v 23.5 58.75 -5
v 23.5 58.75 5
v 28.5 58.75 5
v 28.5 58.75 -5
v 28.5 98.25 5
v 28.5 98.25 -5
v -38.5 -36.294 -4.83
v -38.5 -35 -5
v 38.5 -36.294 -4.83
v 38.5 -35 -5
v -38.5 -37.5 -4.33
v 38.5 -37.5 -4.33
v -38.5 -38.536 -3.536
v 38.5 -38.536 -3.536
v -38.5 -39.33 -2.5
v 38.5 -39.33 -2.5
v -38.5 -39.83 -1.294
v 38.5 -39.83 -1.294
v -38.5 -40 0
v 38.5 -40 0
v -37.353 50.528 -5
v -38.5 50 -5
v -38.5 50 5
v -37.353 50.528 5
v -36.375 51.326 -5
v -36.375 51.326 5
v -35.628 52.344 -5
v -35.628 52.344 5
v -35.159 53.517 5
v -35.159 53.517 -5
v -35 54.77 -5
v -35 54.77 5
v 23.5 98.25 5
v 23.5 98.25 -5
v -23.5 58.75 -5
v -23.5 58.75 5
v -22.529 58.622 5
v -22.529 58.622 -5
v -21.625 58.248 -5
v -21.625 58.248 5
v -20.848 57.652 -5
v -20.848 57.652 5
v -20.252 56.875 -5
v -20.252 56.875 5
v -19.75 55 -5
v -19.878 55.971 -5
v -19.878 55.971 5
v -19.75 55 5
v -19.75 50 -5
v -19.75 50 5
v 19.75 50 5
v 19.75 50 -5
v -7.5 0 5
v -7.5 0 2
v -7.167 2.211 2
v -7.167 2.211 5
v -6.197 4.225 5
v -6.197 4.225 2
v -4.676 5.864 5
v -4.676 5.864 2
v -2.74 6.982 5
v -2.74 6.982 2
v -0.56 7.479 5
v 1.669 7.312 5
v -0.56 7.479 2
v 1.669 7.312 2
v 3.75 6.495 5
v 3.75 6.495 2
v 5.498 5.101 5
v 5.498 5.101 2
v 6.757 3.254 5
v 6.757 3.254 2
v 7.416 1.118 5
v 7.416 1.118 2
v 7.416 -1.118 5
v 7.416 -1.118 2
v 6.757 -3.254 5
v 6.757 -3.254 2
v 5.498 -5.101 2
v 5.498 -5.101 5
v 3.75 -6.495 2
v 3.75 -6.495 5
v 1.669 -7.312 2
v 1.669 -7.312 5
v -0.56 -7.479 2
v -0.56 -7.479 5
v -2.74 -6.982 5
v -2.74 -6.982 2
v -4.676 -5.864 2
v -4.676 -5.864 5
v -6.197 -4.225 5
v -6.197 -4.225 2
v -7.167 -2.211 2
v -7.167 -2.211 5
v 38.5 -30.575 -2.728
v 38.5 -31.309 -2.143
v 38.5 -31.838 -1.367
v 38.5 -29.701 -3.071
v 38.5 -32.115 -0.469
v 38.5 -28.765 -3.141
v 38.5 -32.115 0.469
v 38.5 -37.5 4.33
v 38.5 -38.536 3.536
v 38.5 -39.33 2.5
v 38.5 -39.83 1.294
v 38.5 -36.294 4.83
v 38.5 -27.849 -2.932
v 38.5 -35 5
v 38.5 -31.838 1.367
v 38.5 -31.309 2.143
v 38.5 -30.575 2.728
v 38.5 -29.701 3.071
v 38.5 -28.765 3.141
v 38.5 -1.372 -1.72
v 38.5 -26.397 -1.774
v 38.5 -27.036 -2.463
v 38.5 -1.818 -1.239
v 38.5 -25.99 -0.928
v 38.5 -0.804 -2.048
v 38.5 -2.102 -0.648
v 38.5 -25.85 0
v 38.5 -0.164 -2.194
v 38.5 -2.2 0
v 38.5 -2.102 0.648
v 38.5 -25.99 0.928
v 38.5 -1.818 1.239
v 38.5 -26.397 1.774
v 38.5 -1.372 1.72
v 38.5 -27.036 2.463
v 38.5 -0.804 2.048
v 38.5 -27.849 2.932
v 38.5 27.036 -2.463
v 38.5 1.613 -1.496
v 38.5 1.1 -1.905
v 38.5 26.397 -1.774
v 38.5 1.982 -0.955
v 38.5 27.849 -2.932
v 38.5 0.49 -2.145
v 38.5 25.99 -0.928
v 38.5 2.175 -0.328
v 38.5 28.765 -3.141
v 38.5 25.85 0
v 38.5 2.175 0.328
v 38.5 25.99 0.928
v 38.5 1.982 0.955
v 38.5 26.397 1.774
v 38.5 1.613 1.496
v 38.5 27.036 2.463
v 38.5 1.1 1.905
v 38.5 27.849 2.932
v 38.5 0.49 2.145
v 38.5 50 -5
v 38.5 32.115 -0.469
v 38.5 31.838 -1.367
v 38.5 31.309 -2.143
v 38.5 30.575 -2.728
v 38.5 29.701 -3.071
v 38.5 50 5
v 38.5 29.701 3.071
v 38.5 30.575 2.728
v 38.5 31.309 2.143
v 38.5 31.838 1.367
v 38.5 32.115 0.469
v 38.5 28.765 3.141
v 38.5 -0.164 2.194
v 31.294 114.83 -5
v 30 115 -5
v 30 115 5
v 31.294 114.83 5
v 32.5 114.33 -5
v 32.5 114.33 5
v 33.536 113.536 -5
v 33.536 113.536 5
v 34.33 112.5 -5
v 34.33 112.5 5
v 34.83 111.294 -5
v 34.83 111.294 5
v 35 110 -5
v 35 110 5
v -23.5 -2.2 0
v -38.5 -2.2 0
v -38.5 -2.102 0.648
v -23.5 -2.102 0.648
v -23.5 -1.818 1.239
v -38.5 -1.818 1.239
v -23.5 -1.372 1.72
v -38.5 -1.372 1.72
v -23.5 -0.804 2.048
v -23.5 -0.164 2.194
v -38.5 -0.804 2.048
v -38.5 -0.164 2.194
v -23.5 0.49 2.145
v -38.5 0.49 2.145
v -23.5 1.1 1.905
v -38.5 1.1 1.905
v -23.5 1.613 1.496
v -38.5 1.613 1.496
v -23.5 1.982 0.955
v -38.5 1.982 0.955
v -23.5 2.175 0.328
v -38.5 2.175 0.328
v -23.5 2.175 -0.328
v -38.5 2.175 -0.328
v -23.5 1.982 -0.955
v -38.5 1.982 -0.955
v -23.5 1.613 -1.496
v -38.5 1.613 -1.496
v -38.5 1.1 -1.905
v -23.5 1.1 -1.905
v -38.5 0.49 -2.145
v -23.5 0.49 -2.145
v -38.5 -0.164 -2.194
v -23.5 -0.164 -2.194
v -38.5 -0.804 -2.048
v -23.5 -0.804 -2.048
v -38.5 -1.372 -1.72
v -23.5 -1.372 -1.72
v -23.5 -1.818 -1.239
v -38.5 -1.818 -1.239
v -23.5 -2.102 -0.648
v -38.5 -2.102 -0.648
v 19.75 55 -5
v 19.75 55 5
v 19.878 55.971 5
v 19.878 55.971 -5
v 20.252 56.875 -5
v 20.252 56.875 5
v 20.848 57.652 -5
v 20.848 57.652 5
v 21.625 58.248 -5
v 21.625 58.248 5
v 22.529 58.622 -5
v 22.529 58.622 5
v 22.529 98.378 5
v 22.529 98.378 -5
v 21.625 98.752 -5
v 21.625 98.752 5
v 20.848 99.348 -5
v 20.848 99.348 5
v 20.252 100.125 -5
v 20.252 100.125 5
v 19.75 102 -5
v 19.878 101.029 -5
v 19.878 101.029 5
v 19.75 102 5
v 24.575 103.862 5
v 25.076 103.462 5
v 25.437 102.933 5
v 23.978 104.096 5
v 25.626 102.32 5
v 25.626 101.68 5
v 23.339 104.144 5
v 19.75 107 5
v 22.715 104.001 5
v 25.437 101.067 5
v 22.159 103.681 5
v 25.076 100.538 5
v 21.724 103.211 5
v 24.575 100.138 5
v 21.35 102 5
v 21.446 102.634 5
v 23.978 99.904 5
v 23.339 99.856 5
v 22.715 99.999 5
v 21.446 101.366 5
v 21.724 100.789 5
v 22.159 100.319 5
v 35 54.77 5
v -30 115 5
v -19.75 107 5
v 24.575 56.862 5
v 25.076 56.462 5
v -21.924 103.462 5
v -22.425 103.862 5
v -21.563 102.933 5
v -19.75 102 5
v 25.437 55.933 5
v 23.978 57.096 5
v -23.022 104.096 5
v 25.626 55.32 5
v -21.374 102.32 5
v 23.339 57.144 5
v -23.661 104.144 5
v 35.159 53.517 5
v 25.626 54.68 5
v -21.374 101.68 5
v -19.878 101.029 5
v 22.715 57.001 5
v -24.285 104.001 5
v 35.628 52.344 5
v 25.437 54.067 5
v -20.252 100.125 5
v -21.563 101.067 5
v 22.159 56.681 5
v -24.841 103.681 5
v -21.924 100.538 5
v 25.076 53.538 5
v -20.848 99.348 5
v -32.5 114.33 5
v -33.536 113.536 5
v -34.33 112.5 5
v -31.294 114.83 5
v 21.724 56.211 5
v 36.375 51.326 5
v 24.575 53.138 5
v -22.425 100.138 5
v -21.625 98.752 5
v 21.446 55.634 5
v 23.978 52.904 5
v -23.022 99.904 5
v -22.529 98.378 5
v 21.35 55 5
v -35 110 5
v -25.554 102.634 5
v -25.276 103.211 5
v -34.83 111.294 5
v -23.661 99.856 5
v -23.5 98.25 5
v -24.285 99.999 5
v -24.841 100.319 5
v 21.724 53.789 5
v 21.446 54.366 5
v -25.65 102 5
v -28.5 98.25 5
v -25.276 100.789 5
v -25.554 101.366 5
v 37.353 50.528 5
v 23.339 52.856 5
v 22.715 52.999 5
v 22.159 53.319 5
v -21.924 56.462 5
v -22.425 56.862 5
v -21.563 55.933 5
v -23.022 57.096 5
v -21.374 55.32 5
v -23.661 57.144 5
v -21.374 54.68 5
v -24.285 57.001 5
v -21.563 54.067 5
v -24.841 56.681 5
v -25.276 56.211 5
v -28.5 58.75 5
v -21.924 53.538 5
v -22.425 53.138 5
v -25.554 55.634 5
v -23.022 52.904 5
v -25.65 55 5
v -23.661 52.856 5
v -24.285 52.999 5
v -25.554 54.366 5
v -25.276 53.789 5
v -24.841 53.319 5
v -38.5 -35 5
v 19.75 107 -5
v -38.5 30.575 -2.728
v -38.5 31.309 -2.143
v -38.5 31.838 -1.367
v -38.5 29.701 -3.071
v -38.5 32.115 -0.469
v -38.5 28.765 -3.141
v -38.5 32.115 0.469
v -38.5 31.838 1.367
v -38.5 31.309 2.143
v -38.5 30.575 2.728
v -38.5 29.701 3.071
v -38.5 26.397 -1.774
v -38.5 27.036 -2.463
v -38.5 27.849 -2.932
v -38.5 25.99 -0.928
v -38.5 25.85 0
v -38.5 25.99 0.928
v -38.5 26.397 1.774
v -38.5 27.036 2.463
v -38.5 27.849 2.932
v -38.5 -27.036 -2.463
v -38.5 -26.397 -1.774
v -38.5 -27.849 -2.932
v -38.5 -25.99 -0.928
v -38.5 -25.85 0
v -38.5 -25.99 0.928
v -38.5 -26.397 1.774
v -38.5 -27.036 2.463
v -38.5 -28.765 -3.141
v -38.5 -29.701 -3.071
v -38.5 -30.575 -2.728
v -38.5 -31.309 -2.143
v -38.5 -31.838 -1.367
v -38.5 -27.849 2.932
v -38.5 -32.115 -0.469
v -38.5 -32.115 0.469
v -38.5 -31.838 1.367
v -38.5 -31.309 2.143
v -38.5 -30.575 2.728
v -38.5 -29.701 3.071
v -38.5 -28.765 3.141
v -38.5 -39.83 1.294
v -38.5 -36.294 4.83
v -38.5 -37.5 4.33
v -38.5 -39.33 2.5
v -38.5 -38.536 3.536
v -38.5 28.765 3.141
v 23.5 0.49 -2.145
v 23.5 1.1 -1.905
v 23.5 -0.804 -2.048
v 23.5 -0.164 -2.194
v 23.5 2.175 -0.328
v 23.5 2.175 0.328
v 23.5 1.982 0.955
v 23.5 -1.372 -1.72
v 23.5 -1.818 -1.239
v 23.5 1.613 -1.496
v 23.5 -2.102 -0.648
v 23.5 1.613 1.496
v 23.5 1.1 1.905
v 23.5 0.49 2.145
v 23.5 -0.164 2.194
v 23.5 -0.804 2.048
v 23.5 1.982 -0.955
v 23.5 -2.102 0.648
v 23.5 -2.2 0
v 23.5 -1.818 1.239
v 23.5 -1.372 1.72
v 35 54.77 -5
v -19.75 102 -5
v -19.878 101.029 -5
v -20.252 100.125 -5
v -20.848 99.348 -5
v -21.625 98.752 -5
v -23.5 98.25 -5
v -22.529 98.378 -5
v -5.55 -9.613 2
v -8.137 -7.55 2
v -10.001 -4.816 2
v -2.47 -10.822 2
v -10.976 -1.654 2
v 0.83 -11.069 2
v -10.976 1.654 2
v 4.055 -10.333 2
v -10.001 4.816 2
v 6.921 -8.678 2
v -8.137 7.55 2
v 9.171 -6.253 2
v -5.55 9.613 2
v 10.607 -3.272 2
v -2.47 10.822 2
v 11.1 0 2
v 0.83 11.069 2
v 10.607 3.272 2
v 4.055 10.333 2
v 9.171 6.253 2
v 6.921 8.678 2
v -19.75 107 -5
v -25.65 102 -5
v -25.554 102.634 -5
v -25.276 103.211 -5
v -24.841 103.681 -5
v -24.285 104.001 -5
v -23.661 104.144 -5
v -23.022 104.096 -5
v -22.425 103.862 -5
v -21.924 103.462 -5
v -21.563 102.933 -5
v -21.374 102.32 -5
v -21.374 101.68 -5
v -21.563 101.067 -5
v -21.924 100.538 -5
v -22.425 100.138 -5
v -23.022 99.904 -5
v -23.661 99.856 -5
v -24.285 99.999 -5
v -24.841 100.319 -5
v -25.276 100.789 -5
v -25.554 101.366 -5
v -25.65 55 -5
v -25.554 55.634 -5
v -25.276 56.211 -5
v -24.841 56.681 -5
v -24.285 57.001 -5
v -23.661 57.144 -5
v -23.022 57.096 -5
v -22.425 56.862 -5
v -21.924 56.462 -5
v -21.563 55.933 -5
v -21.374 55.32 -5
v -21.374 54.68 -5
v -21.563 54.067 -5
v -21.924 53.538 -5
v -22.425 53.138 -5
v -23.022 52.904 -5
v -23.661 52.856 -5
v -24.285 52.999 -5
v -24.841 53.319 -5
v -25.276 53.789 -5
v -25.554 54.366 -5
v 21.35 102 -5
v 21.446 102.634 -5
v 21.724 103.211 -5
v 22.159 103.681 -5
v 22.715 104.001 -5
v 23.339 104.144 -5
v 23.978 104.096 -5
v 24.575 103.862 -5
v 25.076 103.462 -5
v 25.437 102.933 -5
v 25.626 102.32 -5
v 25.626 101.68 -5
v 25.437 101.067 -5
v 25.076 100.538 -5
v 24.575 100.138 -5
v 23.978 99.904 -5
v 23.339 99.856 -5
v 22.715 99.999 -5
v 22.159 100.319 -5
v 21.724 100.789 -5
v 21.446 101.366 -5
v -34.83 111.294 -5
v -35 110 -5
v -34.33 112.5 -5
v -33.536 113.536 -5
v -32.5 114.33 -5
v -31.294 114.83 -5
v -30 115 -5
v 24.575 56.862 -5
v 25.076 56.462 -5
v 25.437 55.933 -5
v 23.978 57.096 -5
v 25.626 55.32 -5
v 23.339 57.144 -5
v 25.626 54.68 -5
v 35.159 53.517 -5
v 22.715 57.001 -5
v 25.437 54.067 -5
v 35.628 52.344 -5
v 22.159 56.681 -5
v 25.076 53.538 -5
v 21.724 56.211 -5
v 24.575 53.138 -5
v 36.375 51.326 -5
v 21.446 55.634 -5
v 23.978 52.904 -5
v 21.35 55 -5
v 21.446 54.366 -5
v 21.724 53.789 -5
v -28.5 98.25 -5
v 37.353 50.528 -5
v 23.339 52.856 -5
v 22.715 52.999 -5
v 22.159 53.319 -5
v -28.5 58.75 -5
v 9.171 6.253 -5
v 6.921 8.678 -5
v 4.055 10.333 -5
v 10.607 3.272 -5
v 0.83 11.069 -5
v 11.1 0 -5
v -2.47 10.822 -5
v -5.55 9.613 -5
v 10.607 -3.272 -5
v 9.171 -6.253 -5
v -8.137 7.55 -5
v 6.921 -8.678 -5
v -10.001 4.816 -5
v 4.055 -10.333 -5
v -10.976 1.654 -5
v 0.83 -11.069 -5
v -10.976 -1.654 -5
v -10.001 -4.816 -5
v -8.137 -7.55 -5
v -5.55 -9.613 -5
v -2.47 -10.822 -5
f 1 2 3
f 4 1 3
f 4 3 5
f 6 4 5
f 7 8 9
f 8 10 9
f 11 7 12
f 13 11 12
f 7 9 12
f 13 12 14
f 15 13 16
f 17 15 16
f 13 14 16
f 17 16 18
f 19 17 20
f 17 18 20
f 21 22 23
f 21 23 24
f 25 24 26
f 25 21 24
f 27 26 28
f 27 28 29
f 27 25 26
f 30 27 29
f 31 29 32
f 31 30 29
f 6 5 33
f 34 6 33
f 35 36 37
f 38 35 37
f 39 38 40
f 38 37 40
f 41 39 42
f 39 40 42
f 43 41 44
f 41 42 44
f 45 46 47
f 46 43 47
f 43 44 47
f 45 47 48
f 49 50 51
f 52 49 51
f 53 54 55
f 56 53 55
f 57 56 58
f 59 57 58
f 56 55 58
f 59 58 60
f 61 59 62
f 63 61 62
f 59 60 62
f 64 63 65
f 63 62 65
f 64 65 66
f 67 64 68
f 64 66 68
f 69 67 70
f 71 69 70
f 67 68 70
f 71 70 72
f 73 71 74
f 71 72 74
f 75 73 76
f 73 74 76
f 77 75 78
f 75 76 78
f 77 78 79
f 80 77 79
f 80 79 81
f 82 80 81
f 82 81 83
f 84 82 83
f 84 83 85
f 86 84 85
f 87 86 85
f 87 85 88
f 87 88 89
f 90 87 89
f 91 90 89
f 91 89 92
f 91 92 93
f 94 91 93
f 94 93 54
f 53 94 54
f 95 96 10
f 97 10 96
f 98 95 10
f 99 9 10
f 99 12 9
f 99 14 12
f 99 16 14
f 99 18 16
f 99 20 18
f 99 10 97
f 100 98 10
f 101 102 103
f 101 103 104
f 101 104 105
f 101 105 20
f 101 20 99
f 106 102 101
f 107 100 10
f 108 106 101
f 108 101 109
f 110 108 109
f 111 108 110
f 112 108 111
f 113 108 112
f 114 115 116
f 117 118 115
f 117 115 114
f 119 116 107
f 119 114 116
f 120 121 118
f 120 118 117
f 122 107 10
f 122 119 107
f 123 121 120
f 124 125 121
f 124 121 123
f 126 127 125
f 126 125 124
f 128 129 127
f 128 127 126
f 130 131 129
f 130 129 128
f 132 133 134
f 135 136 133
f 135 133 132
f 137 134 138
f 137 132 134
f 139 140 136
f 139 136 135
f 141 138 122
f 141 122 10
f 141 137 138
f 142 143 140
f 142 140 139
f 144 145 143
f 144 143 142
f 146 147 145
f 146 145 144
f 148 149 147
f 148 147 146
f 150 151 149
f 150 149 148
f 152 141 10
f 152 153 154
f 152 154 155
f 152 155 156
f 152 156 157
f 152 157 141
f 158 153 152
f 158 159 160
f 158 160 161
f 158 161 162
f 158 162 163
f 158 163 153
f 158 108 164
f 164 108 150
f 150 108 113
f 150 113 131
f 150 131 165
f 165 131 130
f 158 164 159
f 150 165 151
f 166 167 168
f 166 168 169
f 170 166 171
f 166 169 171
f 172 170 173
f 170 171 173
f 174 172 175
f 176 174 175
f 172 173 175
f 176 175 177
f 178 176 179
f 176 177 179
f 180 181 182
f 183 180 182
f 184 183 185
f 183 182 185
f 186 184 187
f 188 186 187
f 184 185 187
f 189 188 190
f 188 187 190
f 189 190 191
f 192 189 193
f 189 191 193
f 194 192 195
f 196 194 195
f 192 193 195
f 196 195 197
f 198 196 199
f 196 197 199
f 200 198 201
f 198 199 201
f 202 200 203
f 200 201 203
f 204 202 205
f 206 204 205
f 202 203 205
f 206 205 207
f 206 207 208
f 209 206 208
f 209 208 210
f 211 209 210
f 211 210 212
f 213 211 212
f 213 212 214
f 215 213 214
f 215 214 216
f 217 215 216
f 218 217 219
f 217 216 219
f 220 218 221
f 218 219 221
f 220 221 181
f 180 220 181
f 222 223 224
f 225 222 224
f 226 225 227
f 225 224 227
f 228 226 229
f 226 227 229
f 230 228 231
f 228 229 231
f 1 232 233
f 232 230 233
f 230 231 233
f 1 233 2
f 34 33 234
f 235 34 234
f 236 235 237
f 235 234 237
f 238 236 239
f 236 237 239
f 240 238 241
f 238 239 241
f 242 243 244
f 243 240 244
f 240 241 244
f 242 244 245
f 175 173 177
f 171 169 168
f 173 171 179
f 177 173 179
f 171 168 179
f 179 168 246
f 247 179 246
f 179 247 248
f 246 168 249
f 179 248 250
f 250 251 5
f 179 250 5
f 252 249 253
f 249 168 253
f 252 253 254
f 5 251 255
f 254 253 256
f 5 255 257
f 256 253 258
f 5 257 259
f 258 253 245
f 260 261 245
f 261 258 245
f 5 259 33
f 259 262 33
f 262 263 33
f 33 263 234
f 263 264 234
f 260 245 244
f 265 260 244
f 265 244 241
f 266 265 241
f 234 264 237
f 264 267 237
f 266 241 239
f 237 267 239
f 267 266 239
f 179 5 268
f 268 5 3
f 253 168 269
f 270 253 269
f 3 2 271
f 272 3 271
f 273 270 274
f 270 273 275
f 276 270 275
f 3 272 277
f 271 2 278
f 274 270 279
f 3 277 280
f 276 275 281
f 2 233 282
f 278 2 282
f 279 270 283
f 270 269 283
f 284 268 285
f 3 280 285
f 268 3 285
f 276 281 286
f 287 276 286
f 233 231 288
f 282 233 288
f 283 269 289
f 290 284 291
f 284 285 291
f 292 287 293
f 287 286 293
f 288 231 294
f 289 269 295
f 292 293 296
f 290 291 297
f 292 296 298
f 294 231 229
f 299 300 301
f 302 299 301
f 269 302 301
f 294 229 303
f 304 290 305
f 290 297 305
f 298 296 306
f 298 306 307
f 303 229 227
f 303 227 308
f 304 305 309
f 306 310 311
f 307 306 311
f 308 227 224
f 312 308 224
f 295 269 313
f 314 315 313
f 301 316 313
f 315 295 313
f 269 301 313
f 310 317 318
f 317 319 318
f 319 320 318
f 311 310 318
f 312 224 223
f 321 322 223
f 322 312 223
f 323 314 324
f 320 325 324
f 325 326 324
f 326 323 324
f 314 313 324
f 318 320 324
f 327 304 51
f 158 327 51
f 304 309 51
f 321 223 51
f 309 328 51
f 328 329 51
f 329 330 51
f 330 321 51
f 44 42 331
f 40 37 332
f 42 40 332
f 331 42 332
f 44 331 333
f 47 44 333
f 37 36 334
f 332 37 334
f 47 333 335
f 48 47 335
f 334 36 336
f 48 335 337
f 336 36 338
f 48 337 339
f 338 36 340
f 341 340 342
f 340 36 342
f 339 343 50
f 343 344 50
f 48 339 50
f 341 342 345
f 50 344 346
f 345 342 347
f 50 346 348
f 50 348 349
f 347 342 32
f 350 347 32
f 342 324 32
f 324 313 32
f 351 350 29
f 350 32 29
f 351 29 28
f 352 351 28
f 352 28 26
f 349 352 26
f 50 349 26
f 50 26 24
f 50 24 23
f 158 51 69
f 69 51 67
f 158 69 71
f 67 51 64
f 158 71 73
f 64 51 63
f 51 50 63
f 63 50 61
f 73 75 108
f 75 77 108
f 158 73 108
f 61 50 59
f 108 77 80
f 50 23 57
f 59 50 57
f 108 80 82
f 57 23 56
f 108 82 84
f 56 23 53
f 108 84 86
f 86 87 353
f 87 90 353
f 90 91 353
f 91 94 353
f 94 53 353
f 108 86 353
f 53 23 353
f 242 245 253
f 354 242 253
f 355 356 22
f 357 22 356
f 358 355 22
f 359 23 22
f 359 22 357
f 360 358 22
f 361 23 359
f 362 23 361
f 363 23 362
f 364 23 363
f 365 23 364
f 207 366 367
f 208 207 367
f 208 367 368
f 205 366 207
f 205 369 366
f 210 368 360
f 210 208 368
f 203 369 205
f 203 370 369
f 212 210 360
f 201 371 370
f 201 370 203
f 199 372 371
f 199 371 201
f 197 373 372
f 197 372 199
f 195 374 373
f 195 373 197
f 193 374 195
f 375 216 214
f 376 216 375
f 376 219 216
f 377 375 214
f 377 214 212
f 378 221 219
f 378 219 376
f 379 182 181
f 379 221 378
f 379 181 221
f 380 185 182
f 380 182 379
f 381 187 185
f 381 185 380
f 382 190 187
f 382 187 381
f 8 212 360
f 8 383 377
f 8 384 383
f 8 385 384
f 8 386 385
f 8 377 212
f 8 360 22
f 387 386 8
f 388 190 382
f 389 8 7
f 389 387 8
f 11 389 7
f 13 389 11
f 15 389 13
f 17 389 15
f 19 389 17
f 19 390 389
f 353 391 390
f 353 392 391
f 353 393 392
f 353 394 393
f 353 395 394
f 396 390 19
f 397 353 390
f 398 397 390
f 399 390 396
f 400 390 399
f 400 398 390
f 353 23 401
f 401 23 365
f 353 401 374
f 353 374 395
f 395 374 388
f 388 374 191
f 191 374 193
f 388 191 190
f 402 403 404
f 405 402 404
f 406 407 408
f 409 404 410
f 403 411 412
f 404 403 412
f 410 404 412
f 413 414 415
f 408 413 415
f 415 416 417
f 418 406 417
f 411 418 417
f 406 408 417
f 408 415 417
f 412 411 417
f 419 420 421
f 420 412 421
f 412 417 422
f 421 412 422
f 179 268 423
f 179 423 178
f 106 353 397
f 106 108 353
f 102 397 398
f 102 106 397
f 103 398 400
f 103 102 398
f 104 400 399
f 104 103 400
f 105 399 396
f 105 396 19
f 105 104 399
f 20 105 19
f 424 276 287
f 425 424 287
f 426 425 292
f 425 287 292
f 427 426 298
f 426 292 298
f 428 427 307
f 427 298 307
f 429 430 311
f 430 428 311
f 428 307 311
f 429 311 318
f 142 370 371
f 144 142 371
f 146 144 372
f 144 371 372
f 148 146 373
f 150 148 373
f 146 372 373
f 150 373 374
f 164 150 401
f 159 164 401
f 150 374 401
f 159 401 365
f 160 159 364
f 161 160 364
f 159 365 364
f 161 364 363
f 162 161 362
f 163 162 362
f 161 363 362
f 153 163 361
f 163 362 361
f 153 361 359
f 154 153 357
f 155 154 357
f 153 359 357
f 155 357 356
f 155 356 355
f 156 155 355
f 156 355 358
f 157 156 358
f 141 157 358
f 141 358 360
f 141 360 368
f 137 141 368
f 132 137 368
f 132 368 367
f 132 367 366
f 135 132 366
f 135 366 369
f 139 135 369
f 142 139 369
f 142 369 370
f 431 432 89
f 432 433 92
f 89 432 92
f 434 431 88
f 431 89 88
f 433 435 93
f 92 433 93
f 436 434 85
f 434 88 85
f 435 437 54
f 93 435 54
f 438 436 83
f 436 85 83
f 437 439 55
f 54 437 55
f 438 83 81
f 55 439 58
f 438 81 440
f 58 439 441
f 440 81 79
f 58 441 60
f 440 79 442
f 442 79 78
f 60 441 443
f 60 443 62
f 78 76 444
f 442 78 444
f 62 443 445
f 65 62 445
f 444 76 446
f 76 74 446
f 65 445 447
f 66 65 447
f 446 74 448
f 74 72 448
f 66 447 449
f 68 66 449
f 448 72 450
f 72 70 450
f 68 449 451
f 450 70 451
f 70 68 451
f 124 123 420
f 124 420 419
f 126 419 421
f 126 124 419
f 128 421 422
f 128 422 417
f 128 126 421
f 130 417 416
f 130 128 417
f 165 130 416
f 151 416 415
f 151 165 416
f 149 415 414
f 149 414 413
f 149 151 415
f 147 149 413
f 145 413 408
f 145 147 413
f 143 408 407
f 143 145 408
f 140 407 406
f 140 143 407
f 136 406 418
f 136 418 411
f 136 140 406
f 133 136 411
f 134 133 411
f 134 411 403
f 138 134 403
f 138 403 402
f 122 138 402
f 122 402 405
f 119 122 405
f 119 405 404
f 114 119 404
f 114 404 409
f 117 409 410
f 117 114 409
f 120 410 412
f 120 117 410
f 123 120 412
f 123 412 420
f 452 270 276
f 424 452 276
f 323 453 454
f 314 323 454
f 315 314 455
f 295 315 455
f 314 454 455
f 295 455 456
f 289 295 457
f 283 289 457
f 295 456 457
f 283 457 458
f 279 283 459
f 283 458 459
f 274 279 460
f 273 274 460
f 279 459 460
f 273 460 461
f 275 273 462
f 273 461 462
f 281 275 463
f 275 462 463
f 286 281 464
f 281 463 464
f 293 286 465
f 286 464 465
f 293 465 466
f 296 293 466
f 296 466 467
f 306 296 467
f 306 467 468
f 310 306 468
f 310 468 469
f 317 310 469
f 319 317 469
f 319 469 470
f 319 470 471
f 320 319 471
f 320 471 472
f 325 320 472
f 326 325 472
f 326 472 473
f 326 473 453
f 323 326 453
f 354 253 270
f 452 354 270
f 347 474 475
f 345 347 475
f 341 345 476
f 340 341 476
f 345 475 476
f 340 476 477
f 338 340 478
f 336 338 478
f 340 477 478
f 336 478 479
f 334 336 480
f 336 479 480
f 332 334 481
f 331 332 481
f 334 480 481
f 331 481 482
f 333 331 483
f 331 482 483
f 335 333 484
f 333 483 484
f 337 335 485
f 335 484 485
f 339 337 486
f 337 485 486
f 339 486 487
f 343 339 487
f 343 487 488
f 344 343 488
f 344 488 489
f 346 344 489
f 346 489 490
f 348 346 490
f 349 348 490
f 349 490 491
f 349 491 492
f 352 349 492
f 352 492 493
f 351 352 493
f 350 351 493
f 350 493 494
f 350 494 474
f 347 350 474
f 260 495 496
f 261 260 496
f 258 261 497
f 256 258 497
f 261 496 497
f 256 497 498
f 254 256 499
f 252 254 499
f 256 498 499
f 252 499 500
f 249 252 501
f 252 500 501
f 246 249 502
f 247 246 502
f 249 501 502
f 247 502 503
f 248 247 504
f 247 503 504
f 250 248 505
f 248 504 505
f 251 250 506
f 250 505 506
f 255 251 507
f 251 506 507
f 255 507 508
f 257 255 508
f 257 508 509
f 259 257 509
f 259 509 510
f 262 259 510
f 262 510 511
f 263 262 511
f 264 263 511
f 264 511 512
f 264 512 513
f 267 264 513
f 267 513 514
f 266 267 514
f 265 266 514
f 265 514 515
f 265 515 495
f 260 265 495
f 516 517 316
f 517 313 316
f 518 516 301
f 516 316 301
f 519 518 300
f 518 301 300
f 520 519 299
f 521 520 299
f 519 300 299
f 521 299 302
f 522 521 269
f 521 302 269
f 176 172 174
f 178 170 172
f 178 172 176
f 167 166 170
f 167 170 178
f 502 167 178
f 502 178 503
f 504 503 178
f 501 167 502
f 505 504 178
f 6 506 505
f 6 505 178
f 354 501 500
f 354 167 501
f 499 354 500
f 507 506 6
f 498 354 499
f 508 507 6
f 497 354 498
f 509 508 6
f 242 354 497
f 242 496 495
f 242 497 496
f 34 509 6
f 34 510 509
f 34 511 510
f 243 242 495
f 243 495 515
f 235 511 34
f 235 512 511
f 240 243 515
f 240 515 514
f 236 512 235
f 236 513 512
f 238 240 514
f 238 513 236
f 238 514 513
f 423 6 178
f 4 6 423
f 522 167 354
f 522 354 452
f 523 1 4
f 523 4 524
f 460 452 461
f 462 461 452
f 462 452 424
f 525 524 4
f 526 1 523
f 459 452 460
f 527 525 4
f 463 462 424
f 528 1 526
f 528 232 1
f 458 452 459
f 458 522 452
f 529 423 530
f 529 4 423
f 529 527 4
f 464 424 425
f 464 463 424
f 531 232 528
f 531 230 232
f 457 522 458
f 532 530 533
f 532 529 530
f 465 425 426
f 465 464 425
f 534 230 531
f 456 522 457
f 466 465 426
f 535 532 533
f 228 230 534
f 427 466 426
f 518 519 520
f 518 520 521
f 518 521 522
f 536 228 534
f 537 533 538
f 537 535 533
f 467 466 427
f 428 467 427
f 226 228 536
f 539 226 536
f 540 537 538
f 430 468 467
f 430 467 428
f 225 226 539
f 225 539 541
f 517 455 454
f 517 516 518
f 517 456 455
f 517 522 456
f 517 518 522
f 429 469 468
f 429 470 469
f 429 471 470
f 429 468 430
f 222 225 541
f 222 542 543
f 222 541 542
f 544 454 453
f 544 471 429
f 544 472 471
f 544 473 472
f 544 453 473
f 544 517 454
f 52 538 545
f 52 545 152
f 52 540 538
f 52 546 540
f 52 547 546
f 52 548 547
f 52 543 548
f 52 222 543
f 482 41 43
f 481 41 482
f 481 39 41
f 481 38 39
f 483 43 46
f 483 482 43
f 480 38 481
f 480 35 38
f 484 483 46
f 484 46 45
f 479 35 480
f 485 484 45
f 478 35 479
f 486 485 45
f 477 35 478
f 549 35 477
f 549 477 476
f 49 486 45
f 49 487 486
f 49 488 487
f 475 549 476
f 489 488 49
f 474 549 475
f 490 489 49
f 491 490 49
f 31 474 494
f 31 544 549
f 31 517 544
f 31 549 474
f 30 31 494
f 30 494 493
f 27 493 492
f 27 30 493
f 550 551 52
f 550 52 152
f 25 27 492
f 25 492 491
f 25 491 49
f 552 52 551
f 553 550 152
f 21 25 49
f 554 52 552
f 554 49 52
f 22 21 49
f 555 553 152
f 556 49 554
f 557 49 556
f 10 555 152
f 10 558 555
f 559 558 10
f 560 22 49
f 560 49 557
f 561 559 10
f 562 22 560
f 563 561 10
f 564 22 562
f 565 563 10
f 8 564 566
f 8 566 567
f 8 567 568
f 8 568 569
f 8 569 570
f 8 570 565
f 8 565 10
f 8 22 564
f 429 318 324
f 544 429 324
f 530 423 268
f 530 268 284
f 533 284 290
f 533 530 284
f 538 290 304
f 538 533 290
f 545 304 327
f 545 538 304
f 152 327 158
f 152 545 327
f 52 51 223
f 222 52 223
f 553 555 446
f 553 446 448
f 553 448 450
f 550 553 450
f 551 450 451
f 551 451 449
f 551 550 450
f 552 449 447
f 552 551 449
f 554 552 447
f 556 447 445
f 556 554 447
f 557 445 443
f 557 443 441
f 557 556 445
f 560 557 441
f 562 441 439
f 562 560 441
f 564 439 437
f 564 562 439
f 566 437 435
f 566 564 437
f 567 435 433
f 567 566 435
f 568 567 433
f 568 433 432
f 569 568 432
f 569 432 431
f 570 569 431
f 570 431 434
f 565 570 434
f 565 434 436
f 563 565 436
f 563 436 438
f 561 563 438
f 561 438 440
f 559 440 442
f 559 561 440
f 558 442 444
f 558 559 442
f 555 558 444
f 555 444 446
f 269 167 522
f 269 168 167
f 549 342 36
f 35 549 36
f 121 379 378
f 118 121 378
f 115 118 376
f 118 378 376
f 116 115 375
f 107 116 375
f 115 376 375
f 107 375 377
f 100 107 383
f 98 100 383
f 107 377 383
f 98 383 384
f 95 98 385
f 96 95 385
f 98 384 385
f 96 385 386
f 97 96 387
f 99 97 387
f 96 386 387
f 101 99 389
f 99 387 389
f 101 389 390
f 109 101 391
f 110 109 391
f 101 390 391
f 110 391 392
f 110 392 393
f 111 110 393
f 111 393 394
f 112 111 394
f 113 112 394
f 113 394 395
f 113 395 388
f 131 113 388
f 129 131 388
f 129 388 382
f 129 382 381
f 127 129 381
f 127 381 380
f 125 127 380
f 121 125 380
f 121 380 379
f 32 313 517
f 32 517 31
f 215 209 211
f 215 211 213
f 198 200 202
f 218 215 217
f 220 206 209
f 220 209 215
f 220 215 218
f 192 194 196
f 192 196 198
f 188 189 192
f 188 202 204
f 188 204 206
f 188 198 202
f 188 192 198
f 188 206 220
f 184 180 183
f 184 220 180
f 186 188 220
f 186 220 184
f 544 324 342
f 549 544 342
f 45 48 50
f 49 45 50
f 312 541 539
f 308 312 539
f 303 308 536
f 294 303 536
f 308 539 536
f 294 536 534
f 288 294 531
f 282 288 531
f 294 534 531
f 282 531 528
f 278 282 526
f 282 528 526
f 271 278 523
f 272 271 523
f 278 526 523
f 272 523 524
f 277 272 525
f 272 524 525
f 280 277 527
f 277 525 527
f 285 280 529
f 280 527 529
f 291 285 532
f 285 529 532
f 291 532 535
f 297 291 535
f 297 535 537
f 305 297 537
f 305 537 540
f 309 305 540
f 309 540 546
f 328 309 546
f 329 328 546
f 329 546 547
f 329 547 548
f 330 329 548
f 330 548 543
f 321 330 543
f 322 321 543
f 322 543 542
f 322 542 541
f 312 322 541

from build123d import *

# Parameters (mm, degrees)
AUFSATZ_LINEAR_AUSTRAGEN1_DEPTH  = 5
SKIZZE2_R                        = 3.15
SCHNITT_LINEAR_AUSTRAGEN1_DEPTH  = 139.488266651
SKIZZE3_R                        = 2.2
SCHNITT_LINEAR_AUSTRAGEN2_DEPTH  = 15
VERRUNDUNG2_R                    = 5
SCHNITT_LINEAR_AUSTRAGEN3_DEPTH  = 122.685044274
F_4_3_4_3_DURCHMESSER_BOHRUNG1_D = 4.3
VERRUNDUNG3_R                    = 5
VERRUNDUNG4_R                    = 5
SKIZZE8_R                        = 11.1
SCHNITT_LINEAR_AUSTRAGEN4_DEPTH  = 7
SKIZZE9_R                        = 7.5
SCHNITT_LINEAR_AUSTRAGEN5_DEPTH  = 10


# Some blends are built 0.0001 mm under size
with BuildPart() as part:
    # Skizze1 → Aufsatz-Linear austragen1 (new, symmetric)
    with BuildSketch(Plane.XY):
        Polygon((38.5, 50), (35, 50), (35, 115), (-35, 115), (-35, 50), (-38.5, 50), (-38.5, -40), (38.5, -40), align=None)
    extrude(amount=AUFSATZ_LINEAR_AUSTRAGEN1_DEPTH, both=True)

    # Skizze2 → Schnitt-Linear austragen1 (cut, through all)
    with BuildSketch(Plane.ZY.offset(38.5)):
        with Locations(Location((0, 29, 0), (0, 0, 270))):
            Circle(SKIZZE2_R)
        with Locations(Location((0, -29, 0), (0, 0, 90))):
            Circle(SKIZZE2_R)
    extrude(amount=-SCHNITT_LINEAR_AUSTRAGEN1_DEPTH, mode=Mode.SUBTRACT)

    # Skizze3 → Schnitt-Linear austragen2 (cut)
    with BuildSketch(Plane.ZY.offset(38.5)):
        with Locations(Location((0, 0, 0), (0, 0, 270))):
            Circle(SKIZZE3_R)
    schnitt_linear_austragen2 = extrude(amount=-SCHNITT_LINEAR_AUSTRAGEN2_DEPTH, mode=Mode.SUBTRACT)

    # Spiegeln1: Schnitt-Linear austragen2 across plane
    add(schnitt_linear_austragen2.mirror(Plane(origin=(0, 0, 0), x_dir=(0, 0, 1), z_dir=(1, 0, 0))), mode=Mode.SUBTRACT)

    # Verrundung2
    verrundung2_edges = [part.edges().sort_by_distance(p)[0] for p in [
        (0, -40, -5),
        (0, -40, 5),
    ]]
    fillet(verrundung2_edges, radius=VERRUNDUNG2_R - 0.0001)  # a hair under: the kernel refuses the full size

    # Skizze5 → Schnitt-Linear austragen3 (cut, through all)
    with BuildSketch(Plane.XY.offset(5)):
        with BuildLine():
            Line((19.75, 102), (19.75, 107))
            Line((19.75, 107), (-19.75, 107))
            Line((-19.75, 107), (-19.75, 102))
            ThreePointArc((-19.75, 102), (-20.848349571, 99.348349571), (-23.5, 98.25))
            Line((-23.5, 98.25), (-28.5, 98.25))
            Line((-28.5, 98.25), (-28.5, 58.75))
            Line((-28.5, 58.75), (-23.5, 58.75))
            ThreePointArc((-23.5, 58.75), (-20.848349571, 57.651650429), (-19.75, 55))
            Line((-19.75, 55), (-19.75, 50))
            Line((-19.75, 50), (19.75, 50))
            Line((19.75, 50), (19.75, 55))
            ThreePointArc((19.75, 55), (20.848349571, 57.651650429), (23.5, 58.75))
            Line((23.5, 58.75), (28.5, 58.75))
            Line((28.5, 58.75), (28.5, 98.25))
            Line((28.5, 98.25), (23.5, 98.25))
            ThreePointArc((23.5, 98.25), (20.848349571, 99.348349571), (19.75, 102))
        make_face()
    extrude(amount=-SCHNITT_LINEAR_AUSTRAGEN3_DEPTH, mode=Mode.SUBTRACT)

    # Ø4.3 (4.3) Durchmesser Bohrung1 (through all)
    with Locations(Plane.XY.offset(5)):
        with Locations((-23.5, 102), (-23.5, 55), (23.5, 55), (23.5, 102)):
            Hole(F_4_3_4_3_DURCHMESSER_BOHRUNG1_D / 2)

    # Verrundung3
    verrundung3_edges = [part.edges().sort_by_distance(p)[0] for p in [
        (-35, 115, 0),
        (35, 115, 0),
    ]]
    fillet(verrundung3_edges, radius=VERRUNDUNG3_R)

    # Verrundung4
    # the kernel refuses this fillet: 5 mm, written as the material it adds along each edge
    with BuildSketch(Plane(origin=(35, 50, -5), x_dir=(0, 1, 0), z_dir=(0, 0, 1))) as verrundung4_piece_1:
        with BuildLine():
            CenterArc((4.769696007, -5), VERRUNDUNG4_R, 90, 72.542396876)
            Line((0, -3.5), (-0.09539392, -3.47))
            ThreePointArc((-0.09539392, -3.47), (-0.1, -1.75), (-0.1, 0))
            Line((-0.1, 0), (0, 0.1))
            Line((0, 0.1), (4.769696007, 0.1))
            Line((4.769696007, 0.1), (4.769696007, 0))
        make_face()
    extrude(amount=10)
    with BuildSketch(Plane(origin=(-35, 50, -5), x_dir=(0, 1, 0), z_dir=(0, 0, 1))) as verrundung4_piece_2:
        with BuildLine():
            CenterArc((4.769696007, 5), VERRUNDUNG4_R, 197.457603124, 72.542396876)
            Line((0, 3.5), (-0.09539392, 3.47))
            ThreePointArc((-0.09539392, 3.47), (-0.1, 1.75), (-0.1, 0))
            Line((-0.1, 0), (0, -0.1))
            Line((0, -0.1), (4.769696007, -0.1))
            Line((4.769696007, -0.1), (4.769696007, 0))
        make_face()
    extrude(amount=10)

    # Skizze8 → Schnitt-Linear austragen4 (cut)
    with BuildSketch(Plane.XY.offset(-5)):
        Circle(SKIZZE8_R)
    extrude(amount=SCHNITT_LINEAR_AUSTRAGEN4_DEPTH, mode=Mode.SUBTRACT)

    # Skizze9 → Schnitt-Linear austragen5 (cut)
    with BuildSketch(Plane(origin=(0, 0, 2), x_dir=(-1, 0, 0), z_dir=(0, 0, -1))):
        Circle(SKIZZE9_R)
    extrude(amount=-SCHNITT_LINEAR_AUSTRAGEN5_DEPTH, mode=Mode.SUBTRACT)


solid = part.part
